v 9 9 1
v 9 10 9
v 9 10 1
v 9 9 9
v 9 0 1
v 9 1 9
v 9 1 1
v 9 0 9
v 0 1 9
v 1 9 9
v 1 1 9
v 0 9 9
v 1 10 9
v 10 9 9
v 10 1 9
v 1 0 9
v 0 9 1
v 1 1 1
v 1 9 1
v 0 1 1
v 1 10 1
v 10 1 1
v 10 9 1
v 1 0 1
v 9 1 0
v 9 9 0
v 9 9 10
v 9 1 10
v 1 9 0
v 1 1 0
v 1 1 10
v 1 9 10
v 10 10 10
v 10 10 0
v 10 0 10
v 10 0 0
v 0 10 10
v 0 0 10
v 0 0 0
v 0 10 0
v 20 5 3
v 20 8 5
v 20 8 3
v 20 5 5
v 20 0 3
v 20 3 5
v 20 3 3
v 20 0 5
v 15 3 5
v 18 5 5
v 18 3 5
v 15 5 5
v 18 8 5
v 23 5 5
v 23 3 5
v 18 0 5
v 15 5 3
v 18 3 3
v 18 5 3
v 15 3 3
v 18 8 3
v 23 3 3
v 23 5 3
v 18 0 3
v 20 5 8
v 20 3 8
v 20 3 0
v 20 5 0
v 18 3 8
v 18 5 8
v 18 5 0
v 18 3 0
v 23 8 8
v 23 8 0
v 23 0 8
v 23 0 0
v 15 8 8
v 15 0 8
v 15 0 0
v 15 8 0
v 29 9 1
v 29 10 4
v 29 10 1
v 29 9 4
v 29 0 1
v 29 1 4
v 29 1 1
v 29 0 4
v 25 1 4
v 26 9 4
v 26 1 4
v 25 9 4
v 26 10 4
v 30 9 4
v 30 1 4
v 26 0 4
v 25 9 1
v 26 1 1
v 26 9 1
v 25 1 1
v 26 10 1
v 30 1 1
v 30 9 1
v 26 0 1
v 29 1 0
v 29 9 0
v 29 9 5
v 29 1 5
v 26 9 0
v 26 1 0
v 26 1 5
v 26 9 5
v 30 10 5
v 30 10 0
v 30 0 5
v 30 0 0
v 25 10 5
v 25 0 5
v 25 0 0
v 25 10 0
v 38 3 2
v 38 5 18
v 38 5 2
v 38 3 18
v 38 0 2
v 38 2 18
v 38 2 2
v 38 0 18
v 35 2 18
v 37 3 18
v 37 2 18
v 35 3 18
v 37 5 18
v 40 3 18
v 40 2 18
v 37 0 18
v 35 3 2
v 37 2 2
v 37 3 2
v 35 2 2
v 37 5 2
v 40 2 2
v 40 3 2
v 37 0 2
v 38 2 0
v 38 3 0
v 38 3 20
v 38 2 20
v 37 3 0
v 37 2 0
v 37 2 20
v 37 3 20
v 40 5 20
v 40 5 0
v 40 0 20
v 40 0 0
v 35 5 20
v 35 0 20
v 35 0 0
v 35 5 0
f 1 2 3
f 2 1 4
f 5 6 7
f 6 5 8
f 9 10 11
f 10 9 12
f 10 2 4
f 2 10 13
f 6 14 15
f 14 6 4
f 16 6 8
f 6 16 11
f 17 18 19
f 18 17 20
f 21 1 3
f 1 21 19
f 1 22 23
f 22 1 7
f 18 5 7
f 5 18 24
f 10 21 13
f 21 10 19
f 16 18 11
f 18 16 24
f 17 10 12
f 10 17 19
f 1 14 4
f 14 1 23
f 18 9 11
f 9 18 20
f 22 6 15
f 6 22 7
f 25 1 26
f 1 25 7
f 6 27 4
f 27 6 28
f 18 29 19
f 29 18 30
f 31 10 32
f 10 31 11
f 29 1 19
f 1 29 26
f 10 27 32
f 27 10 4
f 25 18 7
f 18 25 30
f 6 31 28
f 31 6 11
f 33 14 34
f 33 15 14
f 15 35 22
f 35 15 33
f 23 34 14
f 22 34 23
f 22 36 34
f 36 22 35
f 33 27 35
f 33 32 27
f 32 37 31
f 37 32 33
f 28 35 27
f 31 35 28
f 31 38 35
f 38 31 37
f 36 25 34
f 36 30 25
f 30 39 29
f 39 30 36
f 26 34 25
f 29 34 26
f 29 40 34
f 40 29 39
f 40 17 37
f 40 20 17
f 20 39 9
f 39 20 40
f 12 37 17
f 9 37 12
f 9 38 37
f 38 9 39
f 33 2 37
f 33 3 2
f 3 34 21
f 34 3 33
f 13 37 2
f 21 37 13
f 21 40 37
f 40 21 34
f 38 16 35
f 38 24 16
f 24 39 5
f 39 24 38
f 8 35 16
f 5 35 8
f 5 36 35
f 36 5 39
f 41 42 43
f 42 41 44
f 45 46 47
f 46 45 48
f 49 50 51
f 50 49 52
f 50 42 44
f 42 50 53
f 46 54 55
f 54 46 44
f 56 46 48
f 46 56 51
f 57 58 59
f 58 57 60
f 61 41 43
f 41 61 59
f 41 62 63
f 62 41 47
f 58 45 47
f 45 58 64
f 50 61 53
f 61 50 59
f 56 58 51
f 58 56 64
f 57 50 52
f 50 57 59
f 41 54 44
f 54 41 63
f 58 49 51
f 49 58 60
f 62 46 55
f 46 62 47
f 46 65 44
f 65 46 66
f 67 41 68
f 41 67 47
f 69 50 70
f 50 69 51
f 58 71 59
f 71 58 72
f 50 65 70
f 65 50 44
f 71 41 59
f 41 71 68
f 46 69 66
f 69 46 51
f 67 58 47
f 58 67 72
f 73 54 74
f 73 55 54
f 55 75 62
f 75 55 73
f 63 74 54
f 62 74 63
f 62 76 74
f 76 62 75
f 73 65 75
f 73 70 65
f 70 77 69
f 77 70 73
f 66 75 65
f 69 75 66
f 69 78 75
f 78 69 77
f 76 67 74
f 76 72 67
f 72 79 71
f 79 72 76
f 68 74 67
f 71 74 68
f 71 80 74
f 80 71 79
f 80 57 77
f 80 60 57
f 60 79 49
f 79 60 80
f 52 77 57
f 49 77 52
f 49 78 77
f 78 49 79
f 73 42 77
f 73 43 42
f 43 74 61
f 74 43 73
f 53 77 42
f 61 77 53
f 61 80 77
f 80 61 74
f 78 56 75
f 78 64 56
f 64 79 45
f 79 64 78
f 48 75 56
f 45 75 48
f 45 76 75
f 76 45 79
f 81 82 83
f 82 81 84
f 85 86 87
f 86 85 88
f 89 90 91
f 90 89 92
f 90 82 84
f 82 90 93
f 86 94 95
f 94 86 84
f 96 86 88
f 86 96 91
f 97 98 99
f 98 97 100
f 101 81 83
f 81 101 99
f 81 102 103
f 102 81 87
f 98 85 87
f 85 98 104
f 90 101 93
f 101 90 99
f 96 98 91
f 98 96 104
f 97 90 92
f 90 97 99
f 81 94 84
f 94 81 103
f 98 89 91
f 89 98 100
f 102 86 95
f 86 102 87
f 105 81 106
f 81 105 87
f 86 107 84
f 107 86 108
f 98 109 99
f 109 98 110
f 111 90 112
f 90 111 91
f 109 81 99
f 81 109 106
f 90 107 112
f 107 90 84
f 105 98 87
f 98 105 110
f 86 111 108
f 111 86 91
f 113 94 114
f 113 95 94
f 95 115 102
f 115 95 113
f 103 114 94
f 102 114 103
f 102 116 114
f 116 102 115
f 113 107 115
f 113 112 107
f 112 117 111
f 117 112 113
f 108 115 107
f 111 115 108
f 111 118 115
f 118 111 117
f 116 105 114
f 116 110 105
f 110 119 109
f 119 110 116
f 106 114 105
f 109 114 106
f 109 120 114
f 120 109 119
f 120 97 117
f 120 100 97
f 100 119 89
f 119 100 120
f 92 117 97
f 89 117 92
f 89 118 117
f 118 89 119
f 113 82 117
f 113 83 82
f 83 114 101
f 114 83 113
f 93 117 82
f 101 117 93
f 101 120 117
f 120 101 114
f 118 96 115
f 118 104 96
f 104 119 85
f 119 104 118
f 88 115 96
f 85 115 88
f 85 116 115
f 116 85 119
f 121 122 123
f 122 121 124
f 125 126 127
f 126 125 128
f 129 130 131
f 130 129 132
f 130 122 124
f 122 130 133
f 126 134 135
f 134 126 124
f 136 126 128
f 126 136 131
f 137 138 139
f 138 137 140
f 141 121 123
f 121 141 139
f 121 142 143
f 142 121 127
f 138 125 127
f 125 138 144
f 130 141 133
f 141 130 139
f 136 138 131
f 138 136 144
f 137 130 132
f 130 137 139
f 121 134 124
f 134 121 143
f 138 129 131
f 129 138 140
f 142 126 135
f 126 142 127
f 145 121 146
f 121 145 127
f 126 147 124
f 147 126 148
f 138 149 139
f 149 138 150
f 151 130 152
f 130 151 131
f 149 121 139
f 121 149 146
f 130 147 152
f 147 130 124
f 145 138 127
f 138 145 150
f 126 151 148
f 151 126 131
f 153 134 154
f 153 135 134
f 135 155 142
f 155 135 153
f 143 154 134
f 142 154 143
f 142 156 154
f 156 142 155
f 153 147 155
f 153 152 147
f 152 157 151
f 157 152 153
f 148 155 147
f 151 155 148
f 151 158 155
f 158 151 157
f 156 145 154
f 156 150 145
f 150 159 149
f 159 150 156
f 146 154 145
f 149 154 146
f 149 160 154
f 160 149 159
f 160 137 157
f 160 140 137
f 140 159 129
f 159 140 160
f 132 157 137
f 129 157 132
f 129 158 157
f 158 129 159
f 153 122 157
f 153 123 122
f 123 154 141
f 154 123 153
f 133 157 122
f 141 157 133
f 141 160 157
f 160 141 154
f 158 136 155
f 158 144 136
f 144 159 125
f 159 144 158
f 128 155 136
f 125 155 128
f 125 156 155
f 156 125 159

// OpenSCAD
module cube_frame(width, depth, height, frameThickness = 1) {
    difference() {
        cube([width, depth, height]);
        color("red") {
            translate([frameThickness, -frameThickness, frameThickness]) {
                cube([width - (2*frameThickness), depth + (2*frameThickness), height - (2*frameThickness)]);
            }
            translate([-frameThickness, frameThickness, frameThickness]) {
                cube([width + (2*frameThickness), depth - (2*frameThickness), height - (2*frameThickness)]);
            }
            translate([frameThickness, frameThickness, -frameThickness]) {
                cube([width - (2*frameThickness), depth - (2*frameThickness), height + (2*frameThickness)]);
            }
        }
    }
}

translate([0,0,0]) {
    cube_frame(10, 10, 10, 1);
}

translate([15,0,0]) {
    cube_frame(8, 8, 8, 3);
}

translate([25,0,0]) {
    cube_frame(5, 10, 5, 1);
}

translate([35,0,0]) {
    cube_frame(5, 5, 20, 2);
}
